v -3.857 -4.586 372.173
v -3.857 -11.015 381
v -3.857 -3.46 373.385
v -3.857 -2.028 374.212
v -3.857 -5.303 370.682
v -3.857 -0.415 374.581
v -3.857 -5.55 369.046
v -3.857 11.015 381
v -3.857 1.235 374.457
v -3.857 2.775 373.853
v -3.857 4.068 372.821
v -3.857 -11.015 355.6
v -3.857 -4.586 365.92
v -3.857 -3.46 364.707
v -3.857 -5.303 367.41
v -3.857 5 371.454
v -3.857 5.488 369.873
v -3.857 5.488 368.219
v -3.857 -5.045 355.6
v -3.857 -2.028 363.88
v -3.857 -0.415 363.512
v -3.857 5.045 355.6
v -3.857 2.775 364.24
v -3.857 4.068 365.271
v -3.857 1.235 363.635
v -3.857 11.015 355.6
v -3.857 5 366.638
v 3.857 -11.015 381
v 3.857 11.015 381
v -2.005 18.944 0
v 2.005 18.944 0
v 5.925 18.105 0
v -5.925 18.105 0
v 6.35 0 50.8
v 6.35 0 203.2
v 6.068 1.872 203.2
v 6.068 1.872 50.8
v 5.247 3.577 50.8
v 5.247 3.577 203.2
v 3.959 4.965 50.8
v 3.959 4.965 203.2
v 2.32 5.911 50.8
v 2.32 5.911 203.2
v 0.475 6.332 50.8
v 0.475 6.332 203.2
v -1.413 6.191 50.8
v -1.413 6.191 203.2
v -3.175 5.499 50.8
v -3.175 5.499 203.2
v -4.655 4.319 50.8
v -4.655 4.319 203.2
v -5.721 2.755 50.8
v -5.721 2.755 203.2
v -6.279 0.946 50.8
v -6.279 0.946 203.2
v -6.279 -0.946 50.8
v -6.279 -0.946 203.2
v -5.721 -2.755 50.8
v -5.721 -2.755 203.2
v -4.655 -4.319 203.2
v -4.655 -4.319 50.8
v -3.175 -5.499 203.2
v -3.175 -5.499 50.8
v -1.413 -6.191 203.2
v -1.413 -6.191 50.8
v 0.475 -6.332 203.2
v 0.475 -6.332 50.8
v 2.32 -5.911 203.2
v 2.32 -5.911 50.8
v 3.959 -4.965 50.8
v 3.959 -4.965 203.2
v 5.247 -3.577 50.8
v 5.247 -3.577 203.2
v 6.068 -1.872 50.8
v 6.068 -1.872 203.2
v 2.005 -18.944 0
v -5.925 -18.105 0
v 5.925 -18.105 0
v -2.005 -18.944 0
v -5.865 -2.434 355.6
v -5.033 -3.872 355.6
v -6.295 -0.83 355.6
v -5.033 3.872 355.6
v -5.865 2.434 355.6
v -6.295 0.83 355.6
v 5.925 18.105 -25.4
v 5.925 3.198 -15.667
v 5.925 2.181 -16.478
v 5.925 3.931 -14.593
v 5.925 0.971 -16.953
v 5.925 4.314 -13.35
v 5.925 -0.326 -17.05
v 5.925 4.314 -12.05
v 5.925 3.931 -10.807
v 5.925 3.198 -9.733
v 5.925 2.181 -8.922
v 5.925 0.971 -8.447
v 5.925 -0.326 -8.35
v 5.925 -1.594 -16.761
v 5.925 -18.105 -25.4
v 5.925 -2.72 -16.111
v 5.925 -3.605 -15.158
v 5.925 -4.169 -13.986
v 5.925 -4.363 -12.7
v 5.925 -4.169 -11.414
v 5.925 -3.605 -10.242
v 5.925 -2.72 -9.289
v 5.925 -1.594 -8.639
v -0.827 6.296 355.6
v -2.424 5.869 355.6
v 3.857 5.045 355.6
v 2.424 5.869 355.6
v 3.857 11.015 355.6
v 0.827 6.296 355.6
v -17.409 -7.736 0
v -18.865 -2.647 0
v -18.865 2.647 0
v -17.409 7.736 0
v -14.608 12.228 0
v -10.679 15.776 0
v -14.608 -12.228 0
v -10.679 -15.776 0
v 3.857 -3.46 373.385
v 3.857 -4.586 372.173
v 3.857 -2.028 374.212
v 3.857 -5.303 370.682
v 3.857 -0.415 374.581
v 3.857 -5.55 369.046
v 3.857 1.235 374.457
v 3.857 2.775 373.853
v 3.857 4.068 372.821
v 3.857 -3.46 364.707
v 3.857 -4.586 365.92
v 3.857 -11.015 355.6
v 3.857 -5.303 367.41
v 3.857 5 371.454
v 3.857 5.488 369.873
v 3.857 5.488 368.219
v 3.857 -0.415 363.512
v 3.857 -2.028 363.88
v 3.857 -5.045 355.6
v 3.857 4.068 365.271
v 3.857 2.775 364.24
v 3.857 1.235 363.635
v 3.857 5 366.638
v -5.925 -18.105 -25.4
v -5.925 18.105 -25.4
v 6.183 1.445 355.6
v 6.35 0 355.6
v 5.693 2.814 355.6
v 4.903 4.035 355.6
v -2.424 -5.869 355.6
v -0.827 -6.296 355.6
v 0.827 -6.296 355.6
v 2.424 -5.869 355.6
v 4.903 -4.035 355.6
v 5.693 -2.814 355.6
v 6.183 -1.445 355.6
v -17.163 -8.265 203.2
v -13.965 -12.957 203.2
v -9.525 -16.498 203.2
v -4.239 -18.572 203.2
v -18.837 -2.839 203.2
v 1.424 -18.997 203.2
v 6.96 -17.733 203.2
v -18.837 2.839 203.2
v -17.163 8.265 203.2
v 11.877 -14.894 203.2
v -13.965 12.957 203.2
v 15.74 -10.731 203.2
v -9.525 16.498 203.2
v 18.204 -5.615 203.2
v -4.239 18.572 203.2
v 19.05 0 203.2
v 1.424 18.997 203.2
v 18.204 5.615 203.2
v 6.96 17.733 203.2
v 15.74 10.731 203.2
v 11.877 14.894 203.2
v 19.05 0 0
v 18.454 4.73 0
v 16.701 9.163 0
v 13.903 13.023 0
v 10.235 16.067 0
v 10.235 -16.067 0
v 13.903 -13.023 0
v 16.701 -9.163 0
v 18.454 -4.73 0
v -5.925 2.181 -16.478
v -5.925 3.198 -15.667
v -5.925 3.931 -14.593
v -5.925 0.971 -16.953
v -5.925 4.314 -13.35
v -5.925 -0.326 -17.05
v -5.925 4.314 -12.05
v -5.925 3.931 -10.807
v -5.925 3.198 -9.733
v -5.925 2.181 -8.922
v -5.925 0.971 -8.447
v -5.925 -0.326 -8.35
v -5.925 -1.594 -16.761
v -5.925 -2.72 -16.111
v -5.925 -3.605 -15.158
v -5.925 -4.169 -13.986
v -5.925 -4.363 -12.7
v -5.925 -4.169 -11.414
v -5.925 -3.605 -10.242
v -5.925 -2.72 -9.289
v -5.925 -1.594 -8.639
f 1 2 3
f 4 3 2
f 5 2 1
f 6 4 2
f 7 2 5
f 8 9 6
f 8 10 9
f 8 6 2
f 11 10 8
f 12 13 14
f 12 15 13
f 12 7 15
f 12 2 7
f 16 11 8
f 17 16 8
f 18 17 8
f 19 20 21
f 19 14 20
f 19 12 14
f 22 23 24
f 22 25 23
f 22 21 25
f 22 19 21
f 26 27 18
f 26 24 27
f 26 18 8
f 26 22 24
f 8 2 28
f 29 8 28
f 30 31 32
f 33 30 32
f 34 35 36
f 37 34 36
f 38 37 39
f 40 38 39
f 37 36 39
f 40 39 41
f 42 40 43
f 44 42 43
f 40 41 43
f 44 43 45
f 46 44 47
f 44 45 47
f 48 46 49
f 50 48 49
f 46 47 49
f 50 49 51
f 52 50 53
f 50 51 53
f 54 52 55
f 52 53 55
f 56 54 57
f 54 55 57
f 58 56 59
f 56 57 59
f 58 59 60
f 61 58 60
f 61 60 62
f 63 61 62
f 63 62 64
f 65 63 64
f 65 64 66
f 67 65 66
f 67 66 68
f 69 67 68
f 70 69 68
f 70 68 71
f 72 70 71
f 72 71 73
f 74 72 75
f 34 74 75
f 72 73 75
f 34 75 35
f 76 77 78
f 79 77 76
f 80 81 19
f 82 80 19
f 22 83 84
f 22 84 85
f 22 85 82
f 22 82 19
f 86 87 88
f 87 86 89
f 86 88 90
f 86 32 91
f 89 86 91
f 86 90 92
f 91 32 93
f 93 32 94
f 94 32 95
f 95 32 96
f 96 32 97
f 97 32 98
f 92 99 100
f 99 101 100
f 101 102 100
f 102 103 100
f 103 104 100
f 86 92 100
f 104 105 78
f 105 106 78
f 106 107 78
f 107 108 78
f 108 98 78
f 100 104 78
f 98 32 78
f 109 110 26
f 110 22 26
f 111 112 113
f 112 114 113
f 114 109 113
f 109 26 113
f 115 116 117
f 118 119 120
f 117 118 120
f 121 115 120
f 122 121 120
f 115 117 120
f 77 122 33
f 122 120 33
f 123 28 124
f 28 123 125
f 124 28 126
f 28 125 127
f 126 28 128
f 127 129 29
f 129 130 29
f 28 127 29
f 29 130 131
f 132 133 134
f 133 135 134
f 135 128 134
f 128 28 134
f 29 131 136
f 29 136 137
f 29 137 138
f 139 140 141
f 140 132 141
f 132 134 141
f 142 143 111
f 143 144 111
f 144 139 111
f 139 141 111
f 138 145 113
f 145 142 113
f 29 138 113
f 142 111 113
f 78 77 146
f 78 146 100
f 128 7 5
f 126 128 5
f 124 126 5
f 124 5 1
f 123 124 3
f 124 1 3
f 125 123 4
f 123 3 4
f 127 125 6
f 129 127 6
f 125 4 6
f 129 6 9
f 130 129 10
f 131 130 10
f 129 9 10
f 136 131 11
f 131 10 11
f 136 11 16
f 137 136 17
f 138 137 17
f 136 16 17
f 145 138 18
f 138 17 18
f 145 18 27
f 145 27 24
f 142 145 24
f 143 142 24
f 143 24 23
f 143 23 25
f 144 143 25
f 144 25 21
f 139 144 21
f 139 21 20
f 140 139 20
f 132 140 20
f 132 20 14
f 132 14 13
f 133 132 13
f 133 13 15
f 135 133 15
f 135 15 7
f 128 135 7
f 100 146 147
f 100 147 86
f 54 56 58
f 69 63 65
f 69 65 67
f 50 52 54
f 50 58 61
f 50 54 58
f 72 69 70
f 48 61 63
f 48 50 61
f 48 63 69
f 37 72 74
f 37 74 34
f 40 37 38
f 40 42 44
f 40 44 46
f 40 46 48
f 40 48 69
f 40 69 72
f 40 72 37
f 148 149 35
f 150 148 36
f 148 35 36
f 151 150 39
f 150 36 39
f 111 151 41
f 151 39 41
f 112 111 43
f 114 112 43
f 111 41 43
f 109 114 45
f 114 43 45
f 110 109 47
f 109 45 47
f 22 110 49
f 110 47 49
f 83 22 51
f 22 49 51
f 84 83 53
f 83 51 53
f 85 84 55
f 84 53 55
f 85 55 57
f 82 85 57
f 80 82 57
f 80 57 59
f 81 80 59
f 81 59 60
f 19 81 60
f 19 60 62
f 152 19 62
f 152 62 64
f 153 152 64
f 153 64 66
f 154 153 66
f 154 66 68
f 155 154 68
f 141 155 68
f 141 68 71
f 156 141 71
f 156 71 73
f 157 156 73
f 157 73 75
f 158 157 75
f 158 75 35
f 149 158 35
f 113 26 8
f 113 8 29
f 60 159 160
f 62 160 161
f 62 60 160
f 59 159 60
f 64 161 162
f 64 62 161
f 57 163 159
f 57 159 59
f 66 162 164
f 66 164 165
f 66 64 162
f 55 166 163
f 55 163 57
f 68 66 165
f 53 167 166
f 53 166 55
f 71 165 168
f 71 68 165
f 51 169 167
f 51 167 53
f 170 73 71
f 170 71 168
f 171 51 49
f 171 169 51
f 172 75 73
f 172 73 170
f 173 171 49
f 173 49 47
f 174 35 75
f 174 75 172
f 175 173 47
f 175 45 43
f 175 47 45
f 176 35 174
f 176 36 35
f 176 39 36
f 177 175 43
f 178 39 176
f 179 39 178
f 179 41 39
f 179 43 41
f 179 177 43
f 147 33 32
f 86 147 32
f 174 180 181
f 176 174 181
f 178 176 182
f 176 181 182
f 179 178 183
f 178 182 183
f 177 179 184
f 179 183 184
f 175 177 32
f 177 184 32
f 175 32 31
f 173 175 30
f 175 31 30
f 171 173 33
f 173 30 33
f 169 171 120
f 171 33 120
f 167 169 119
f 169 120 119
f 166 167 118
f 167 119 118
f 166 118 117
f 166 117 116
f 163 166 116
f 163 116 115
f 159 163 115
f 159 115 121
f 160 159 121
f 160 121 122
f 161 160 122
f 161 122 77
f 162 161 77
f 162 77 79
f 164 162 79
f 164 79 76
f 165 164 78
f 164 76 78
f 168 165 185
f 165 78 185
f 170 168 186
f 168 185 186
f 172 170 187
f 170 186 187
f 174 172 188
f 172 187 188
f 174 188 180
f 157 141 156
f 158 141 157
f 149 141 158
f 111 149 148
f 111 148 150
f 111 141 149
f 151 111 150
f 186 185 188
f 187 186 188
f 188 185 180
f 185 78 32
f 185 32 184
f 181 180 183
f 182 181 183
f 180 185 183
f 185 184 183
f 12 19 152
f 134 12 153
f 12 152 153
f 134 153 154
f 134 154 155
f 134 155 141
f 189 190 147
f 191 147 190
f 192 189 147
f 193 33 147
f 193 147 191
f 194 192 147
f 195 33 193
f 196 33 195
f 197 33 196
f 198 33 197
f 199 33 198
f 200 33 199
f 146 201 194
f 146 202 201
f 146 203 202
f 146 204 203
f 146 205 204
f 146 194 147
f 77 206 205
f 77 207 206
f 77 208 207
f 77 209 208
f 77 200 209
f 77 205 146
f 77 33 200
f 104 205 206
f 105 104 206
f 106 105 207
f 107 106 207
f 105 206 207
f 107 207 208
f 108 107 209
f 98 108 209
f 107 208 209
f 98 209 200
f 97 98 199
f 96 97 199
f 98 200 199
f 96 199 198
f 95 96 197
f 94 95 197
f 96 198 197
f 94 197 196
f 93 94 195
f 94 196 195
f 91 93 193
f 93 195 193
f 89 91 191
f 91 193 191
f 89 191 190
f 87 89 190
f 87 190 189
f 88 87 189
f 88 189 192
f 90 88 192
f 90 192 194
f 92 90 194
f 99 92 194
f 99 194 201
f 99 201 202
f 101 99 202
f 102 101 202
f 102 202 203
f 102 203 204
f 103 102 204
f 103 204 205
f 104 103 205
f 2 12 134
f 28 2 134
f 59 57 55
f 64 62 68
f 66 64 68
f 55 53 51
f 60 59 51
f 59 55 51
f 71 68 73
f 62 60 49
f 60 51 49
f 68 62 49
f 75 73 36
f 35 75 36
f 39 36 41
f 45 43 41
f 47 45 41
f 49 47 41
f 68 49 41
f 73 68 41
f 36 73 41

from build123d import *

# Parameters (mm, degrees)
F0_R      = 19.05
F1_DEPTH  = 203.2
F2_R      = 6.35
F3_DEPTH  = 152.4
F4_R      = 6.35
F5_DEPTH  = 152.4
F6_W      = 7.713392
F6_H      = 22.030858
F7_DEPTH  = 25.4
F8_R      = 5.550067
F9_DEPTH  = 25.4
F10_W     = 11.85033
F10_H     = 36.210216
F11_DEPTH = 25.4
F12_R     = 4.362635
F13_DEPTH = 25.4


with BuildPart() as f1:
    # F0 (on Top) → F1 (new body)
    with BuildSketch(Plane.XY):
        Circle(F0_R)
    extrude(amount=F1_DEPTH)

    # F2 (on face) → F3 (cut)
    with BuildSketch(Plane.XY.offset(203.2)):
        Circle(F2_R)
    extrude(amount=-F3_DEPTH, mode=Mode.SUBTRACT)

    # F10 (on face) → F11 (join)
    with BuildSketch(Plane(origin=(0, 0, 0), x_dir=(1, 0, 0), z_dir=(0, 0, -1))):
        Rectangle(F10_W, F10_H)
    extrude(amount=F11_DEPTH)

    # F12 (on face) → F13 (cut)
    with BuildSketch(Plane(origin=(-5.925165, 0, 0), x_dir=(0, -1, 0), z_dir=(-1, 0, 0))):
        with Locations((0, -12.7)):
            Circle(F12_R)
    extrude(amount=-F13_DEPTH, mode=Mode.SUBTRACT)


with BuildPart() as f5:
    # F4 (on face) → F5 (new body)
    with BuildSketch(Plane.XY.offset(203.2)):
        Circle(F4_R)
    extrude(amount=F5_DEPTH)

    # F6 (on face) → F7 (join)
    with BuildSketch(Plane.XY.offset(355.6)):
        Rectangle(F6_W, F6_H)
    extrude(amount=F7_DEPTH)

    # F8 (on face) → F9 (cut)
    with BuildSketch(Plane(origin=(-3.856696, 0, 0), x_dir=(0, -1, 0), z_dir=(-1, 0, 0))):
        with Locations((0, 369.046062)):
            Circle(F8_R)
    extrude(amount=-F9_DEPTH, mode=Mode.SUBTRACT)


solid = Compound([f1.part, f5.part])
